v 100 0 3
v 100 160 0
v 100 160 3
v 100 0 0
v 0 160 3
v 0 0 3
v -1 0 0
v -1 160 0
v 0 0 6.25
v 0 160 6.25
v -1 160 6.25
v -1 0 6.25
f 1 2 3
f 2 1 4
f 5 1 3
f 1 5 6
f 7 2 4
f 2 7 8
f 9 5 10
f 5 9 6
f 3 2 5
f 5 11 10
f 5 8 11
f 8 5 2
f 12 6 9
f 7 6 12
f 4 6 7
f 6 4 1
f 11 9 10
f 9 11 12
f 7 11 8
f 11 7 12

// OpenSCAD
// file: card_lib.scad
$fa = 6;
$fs = 0.875;

face_thickness = 3;
card_height = 160;
card_width = 100;
text_size = 9;
tolerance = 0.25;

module card_face() {
    cube([card_width, card_height, face_thickness]);
}

module text_line(text, x, y) {
    translate([x, y])
    text(text, text_size, "Lato:style=Bold");
}

module render_text() {
    text_line("To Suzi", 10, card_height - text_size - 16);
    text_line("Merry 3D", 10, card_height / 2 + 7);
    text_line("christmas!", 10, card_height / 2 - 7);
    text_line("The most love", 10, 30);
    text_line("from Jacek <3", 10, 16);
}
// main file
include<card_lib.scad>;

$fa = 6;
$fs = 0.875;

// Card back
union() {
    card_face();

    translate([-1, 0, 0])
    cube([1, card_height, 2 * face_thickness + tolerance]);
}
